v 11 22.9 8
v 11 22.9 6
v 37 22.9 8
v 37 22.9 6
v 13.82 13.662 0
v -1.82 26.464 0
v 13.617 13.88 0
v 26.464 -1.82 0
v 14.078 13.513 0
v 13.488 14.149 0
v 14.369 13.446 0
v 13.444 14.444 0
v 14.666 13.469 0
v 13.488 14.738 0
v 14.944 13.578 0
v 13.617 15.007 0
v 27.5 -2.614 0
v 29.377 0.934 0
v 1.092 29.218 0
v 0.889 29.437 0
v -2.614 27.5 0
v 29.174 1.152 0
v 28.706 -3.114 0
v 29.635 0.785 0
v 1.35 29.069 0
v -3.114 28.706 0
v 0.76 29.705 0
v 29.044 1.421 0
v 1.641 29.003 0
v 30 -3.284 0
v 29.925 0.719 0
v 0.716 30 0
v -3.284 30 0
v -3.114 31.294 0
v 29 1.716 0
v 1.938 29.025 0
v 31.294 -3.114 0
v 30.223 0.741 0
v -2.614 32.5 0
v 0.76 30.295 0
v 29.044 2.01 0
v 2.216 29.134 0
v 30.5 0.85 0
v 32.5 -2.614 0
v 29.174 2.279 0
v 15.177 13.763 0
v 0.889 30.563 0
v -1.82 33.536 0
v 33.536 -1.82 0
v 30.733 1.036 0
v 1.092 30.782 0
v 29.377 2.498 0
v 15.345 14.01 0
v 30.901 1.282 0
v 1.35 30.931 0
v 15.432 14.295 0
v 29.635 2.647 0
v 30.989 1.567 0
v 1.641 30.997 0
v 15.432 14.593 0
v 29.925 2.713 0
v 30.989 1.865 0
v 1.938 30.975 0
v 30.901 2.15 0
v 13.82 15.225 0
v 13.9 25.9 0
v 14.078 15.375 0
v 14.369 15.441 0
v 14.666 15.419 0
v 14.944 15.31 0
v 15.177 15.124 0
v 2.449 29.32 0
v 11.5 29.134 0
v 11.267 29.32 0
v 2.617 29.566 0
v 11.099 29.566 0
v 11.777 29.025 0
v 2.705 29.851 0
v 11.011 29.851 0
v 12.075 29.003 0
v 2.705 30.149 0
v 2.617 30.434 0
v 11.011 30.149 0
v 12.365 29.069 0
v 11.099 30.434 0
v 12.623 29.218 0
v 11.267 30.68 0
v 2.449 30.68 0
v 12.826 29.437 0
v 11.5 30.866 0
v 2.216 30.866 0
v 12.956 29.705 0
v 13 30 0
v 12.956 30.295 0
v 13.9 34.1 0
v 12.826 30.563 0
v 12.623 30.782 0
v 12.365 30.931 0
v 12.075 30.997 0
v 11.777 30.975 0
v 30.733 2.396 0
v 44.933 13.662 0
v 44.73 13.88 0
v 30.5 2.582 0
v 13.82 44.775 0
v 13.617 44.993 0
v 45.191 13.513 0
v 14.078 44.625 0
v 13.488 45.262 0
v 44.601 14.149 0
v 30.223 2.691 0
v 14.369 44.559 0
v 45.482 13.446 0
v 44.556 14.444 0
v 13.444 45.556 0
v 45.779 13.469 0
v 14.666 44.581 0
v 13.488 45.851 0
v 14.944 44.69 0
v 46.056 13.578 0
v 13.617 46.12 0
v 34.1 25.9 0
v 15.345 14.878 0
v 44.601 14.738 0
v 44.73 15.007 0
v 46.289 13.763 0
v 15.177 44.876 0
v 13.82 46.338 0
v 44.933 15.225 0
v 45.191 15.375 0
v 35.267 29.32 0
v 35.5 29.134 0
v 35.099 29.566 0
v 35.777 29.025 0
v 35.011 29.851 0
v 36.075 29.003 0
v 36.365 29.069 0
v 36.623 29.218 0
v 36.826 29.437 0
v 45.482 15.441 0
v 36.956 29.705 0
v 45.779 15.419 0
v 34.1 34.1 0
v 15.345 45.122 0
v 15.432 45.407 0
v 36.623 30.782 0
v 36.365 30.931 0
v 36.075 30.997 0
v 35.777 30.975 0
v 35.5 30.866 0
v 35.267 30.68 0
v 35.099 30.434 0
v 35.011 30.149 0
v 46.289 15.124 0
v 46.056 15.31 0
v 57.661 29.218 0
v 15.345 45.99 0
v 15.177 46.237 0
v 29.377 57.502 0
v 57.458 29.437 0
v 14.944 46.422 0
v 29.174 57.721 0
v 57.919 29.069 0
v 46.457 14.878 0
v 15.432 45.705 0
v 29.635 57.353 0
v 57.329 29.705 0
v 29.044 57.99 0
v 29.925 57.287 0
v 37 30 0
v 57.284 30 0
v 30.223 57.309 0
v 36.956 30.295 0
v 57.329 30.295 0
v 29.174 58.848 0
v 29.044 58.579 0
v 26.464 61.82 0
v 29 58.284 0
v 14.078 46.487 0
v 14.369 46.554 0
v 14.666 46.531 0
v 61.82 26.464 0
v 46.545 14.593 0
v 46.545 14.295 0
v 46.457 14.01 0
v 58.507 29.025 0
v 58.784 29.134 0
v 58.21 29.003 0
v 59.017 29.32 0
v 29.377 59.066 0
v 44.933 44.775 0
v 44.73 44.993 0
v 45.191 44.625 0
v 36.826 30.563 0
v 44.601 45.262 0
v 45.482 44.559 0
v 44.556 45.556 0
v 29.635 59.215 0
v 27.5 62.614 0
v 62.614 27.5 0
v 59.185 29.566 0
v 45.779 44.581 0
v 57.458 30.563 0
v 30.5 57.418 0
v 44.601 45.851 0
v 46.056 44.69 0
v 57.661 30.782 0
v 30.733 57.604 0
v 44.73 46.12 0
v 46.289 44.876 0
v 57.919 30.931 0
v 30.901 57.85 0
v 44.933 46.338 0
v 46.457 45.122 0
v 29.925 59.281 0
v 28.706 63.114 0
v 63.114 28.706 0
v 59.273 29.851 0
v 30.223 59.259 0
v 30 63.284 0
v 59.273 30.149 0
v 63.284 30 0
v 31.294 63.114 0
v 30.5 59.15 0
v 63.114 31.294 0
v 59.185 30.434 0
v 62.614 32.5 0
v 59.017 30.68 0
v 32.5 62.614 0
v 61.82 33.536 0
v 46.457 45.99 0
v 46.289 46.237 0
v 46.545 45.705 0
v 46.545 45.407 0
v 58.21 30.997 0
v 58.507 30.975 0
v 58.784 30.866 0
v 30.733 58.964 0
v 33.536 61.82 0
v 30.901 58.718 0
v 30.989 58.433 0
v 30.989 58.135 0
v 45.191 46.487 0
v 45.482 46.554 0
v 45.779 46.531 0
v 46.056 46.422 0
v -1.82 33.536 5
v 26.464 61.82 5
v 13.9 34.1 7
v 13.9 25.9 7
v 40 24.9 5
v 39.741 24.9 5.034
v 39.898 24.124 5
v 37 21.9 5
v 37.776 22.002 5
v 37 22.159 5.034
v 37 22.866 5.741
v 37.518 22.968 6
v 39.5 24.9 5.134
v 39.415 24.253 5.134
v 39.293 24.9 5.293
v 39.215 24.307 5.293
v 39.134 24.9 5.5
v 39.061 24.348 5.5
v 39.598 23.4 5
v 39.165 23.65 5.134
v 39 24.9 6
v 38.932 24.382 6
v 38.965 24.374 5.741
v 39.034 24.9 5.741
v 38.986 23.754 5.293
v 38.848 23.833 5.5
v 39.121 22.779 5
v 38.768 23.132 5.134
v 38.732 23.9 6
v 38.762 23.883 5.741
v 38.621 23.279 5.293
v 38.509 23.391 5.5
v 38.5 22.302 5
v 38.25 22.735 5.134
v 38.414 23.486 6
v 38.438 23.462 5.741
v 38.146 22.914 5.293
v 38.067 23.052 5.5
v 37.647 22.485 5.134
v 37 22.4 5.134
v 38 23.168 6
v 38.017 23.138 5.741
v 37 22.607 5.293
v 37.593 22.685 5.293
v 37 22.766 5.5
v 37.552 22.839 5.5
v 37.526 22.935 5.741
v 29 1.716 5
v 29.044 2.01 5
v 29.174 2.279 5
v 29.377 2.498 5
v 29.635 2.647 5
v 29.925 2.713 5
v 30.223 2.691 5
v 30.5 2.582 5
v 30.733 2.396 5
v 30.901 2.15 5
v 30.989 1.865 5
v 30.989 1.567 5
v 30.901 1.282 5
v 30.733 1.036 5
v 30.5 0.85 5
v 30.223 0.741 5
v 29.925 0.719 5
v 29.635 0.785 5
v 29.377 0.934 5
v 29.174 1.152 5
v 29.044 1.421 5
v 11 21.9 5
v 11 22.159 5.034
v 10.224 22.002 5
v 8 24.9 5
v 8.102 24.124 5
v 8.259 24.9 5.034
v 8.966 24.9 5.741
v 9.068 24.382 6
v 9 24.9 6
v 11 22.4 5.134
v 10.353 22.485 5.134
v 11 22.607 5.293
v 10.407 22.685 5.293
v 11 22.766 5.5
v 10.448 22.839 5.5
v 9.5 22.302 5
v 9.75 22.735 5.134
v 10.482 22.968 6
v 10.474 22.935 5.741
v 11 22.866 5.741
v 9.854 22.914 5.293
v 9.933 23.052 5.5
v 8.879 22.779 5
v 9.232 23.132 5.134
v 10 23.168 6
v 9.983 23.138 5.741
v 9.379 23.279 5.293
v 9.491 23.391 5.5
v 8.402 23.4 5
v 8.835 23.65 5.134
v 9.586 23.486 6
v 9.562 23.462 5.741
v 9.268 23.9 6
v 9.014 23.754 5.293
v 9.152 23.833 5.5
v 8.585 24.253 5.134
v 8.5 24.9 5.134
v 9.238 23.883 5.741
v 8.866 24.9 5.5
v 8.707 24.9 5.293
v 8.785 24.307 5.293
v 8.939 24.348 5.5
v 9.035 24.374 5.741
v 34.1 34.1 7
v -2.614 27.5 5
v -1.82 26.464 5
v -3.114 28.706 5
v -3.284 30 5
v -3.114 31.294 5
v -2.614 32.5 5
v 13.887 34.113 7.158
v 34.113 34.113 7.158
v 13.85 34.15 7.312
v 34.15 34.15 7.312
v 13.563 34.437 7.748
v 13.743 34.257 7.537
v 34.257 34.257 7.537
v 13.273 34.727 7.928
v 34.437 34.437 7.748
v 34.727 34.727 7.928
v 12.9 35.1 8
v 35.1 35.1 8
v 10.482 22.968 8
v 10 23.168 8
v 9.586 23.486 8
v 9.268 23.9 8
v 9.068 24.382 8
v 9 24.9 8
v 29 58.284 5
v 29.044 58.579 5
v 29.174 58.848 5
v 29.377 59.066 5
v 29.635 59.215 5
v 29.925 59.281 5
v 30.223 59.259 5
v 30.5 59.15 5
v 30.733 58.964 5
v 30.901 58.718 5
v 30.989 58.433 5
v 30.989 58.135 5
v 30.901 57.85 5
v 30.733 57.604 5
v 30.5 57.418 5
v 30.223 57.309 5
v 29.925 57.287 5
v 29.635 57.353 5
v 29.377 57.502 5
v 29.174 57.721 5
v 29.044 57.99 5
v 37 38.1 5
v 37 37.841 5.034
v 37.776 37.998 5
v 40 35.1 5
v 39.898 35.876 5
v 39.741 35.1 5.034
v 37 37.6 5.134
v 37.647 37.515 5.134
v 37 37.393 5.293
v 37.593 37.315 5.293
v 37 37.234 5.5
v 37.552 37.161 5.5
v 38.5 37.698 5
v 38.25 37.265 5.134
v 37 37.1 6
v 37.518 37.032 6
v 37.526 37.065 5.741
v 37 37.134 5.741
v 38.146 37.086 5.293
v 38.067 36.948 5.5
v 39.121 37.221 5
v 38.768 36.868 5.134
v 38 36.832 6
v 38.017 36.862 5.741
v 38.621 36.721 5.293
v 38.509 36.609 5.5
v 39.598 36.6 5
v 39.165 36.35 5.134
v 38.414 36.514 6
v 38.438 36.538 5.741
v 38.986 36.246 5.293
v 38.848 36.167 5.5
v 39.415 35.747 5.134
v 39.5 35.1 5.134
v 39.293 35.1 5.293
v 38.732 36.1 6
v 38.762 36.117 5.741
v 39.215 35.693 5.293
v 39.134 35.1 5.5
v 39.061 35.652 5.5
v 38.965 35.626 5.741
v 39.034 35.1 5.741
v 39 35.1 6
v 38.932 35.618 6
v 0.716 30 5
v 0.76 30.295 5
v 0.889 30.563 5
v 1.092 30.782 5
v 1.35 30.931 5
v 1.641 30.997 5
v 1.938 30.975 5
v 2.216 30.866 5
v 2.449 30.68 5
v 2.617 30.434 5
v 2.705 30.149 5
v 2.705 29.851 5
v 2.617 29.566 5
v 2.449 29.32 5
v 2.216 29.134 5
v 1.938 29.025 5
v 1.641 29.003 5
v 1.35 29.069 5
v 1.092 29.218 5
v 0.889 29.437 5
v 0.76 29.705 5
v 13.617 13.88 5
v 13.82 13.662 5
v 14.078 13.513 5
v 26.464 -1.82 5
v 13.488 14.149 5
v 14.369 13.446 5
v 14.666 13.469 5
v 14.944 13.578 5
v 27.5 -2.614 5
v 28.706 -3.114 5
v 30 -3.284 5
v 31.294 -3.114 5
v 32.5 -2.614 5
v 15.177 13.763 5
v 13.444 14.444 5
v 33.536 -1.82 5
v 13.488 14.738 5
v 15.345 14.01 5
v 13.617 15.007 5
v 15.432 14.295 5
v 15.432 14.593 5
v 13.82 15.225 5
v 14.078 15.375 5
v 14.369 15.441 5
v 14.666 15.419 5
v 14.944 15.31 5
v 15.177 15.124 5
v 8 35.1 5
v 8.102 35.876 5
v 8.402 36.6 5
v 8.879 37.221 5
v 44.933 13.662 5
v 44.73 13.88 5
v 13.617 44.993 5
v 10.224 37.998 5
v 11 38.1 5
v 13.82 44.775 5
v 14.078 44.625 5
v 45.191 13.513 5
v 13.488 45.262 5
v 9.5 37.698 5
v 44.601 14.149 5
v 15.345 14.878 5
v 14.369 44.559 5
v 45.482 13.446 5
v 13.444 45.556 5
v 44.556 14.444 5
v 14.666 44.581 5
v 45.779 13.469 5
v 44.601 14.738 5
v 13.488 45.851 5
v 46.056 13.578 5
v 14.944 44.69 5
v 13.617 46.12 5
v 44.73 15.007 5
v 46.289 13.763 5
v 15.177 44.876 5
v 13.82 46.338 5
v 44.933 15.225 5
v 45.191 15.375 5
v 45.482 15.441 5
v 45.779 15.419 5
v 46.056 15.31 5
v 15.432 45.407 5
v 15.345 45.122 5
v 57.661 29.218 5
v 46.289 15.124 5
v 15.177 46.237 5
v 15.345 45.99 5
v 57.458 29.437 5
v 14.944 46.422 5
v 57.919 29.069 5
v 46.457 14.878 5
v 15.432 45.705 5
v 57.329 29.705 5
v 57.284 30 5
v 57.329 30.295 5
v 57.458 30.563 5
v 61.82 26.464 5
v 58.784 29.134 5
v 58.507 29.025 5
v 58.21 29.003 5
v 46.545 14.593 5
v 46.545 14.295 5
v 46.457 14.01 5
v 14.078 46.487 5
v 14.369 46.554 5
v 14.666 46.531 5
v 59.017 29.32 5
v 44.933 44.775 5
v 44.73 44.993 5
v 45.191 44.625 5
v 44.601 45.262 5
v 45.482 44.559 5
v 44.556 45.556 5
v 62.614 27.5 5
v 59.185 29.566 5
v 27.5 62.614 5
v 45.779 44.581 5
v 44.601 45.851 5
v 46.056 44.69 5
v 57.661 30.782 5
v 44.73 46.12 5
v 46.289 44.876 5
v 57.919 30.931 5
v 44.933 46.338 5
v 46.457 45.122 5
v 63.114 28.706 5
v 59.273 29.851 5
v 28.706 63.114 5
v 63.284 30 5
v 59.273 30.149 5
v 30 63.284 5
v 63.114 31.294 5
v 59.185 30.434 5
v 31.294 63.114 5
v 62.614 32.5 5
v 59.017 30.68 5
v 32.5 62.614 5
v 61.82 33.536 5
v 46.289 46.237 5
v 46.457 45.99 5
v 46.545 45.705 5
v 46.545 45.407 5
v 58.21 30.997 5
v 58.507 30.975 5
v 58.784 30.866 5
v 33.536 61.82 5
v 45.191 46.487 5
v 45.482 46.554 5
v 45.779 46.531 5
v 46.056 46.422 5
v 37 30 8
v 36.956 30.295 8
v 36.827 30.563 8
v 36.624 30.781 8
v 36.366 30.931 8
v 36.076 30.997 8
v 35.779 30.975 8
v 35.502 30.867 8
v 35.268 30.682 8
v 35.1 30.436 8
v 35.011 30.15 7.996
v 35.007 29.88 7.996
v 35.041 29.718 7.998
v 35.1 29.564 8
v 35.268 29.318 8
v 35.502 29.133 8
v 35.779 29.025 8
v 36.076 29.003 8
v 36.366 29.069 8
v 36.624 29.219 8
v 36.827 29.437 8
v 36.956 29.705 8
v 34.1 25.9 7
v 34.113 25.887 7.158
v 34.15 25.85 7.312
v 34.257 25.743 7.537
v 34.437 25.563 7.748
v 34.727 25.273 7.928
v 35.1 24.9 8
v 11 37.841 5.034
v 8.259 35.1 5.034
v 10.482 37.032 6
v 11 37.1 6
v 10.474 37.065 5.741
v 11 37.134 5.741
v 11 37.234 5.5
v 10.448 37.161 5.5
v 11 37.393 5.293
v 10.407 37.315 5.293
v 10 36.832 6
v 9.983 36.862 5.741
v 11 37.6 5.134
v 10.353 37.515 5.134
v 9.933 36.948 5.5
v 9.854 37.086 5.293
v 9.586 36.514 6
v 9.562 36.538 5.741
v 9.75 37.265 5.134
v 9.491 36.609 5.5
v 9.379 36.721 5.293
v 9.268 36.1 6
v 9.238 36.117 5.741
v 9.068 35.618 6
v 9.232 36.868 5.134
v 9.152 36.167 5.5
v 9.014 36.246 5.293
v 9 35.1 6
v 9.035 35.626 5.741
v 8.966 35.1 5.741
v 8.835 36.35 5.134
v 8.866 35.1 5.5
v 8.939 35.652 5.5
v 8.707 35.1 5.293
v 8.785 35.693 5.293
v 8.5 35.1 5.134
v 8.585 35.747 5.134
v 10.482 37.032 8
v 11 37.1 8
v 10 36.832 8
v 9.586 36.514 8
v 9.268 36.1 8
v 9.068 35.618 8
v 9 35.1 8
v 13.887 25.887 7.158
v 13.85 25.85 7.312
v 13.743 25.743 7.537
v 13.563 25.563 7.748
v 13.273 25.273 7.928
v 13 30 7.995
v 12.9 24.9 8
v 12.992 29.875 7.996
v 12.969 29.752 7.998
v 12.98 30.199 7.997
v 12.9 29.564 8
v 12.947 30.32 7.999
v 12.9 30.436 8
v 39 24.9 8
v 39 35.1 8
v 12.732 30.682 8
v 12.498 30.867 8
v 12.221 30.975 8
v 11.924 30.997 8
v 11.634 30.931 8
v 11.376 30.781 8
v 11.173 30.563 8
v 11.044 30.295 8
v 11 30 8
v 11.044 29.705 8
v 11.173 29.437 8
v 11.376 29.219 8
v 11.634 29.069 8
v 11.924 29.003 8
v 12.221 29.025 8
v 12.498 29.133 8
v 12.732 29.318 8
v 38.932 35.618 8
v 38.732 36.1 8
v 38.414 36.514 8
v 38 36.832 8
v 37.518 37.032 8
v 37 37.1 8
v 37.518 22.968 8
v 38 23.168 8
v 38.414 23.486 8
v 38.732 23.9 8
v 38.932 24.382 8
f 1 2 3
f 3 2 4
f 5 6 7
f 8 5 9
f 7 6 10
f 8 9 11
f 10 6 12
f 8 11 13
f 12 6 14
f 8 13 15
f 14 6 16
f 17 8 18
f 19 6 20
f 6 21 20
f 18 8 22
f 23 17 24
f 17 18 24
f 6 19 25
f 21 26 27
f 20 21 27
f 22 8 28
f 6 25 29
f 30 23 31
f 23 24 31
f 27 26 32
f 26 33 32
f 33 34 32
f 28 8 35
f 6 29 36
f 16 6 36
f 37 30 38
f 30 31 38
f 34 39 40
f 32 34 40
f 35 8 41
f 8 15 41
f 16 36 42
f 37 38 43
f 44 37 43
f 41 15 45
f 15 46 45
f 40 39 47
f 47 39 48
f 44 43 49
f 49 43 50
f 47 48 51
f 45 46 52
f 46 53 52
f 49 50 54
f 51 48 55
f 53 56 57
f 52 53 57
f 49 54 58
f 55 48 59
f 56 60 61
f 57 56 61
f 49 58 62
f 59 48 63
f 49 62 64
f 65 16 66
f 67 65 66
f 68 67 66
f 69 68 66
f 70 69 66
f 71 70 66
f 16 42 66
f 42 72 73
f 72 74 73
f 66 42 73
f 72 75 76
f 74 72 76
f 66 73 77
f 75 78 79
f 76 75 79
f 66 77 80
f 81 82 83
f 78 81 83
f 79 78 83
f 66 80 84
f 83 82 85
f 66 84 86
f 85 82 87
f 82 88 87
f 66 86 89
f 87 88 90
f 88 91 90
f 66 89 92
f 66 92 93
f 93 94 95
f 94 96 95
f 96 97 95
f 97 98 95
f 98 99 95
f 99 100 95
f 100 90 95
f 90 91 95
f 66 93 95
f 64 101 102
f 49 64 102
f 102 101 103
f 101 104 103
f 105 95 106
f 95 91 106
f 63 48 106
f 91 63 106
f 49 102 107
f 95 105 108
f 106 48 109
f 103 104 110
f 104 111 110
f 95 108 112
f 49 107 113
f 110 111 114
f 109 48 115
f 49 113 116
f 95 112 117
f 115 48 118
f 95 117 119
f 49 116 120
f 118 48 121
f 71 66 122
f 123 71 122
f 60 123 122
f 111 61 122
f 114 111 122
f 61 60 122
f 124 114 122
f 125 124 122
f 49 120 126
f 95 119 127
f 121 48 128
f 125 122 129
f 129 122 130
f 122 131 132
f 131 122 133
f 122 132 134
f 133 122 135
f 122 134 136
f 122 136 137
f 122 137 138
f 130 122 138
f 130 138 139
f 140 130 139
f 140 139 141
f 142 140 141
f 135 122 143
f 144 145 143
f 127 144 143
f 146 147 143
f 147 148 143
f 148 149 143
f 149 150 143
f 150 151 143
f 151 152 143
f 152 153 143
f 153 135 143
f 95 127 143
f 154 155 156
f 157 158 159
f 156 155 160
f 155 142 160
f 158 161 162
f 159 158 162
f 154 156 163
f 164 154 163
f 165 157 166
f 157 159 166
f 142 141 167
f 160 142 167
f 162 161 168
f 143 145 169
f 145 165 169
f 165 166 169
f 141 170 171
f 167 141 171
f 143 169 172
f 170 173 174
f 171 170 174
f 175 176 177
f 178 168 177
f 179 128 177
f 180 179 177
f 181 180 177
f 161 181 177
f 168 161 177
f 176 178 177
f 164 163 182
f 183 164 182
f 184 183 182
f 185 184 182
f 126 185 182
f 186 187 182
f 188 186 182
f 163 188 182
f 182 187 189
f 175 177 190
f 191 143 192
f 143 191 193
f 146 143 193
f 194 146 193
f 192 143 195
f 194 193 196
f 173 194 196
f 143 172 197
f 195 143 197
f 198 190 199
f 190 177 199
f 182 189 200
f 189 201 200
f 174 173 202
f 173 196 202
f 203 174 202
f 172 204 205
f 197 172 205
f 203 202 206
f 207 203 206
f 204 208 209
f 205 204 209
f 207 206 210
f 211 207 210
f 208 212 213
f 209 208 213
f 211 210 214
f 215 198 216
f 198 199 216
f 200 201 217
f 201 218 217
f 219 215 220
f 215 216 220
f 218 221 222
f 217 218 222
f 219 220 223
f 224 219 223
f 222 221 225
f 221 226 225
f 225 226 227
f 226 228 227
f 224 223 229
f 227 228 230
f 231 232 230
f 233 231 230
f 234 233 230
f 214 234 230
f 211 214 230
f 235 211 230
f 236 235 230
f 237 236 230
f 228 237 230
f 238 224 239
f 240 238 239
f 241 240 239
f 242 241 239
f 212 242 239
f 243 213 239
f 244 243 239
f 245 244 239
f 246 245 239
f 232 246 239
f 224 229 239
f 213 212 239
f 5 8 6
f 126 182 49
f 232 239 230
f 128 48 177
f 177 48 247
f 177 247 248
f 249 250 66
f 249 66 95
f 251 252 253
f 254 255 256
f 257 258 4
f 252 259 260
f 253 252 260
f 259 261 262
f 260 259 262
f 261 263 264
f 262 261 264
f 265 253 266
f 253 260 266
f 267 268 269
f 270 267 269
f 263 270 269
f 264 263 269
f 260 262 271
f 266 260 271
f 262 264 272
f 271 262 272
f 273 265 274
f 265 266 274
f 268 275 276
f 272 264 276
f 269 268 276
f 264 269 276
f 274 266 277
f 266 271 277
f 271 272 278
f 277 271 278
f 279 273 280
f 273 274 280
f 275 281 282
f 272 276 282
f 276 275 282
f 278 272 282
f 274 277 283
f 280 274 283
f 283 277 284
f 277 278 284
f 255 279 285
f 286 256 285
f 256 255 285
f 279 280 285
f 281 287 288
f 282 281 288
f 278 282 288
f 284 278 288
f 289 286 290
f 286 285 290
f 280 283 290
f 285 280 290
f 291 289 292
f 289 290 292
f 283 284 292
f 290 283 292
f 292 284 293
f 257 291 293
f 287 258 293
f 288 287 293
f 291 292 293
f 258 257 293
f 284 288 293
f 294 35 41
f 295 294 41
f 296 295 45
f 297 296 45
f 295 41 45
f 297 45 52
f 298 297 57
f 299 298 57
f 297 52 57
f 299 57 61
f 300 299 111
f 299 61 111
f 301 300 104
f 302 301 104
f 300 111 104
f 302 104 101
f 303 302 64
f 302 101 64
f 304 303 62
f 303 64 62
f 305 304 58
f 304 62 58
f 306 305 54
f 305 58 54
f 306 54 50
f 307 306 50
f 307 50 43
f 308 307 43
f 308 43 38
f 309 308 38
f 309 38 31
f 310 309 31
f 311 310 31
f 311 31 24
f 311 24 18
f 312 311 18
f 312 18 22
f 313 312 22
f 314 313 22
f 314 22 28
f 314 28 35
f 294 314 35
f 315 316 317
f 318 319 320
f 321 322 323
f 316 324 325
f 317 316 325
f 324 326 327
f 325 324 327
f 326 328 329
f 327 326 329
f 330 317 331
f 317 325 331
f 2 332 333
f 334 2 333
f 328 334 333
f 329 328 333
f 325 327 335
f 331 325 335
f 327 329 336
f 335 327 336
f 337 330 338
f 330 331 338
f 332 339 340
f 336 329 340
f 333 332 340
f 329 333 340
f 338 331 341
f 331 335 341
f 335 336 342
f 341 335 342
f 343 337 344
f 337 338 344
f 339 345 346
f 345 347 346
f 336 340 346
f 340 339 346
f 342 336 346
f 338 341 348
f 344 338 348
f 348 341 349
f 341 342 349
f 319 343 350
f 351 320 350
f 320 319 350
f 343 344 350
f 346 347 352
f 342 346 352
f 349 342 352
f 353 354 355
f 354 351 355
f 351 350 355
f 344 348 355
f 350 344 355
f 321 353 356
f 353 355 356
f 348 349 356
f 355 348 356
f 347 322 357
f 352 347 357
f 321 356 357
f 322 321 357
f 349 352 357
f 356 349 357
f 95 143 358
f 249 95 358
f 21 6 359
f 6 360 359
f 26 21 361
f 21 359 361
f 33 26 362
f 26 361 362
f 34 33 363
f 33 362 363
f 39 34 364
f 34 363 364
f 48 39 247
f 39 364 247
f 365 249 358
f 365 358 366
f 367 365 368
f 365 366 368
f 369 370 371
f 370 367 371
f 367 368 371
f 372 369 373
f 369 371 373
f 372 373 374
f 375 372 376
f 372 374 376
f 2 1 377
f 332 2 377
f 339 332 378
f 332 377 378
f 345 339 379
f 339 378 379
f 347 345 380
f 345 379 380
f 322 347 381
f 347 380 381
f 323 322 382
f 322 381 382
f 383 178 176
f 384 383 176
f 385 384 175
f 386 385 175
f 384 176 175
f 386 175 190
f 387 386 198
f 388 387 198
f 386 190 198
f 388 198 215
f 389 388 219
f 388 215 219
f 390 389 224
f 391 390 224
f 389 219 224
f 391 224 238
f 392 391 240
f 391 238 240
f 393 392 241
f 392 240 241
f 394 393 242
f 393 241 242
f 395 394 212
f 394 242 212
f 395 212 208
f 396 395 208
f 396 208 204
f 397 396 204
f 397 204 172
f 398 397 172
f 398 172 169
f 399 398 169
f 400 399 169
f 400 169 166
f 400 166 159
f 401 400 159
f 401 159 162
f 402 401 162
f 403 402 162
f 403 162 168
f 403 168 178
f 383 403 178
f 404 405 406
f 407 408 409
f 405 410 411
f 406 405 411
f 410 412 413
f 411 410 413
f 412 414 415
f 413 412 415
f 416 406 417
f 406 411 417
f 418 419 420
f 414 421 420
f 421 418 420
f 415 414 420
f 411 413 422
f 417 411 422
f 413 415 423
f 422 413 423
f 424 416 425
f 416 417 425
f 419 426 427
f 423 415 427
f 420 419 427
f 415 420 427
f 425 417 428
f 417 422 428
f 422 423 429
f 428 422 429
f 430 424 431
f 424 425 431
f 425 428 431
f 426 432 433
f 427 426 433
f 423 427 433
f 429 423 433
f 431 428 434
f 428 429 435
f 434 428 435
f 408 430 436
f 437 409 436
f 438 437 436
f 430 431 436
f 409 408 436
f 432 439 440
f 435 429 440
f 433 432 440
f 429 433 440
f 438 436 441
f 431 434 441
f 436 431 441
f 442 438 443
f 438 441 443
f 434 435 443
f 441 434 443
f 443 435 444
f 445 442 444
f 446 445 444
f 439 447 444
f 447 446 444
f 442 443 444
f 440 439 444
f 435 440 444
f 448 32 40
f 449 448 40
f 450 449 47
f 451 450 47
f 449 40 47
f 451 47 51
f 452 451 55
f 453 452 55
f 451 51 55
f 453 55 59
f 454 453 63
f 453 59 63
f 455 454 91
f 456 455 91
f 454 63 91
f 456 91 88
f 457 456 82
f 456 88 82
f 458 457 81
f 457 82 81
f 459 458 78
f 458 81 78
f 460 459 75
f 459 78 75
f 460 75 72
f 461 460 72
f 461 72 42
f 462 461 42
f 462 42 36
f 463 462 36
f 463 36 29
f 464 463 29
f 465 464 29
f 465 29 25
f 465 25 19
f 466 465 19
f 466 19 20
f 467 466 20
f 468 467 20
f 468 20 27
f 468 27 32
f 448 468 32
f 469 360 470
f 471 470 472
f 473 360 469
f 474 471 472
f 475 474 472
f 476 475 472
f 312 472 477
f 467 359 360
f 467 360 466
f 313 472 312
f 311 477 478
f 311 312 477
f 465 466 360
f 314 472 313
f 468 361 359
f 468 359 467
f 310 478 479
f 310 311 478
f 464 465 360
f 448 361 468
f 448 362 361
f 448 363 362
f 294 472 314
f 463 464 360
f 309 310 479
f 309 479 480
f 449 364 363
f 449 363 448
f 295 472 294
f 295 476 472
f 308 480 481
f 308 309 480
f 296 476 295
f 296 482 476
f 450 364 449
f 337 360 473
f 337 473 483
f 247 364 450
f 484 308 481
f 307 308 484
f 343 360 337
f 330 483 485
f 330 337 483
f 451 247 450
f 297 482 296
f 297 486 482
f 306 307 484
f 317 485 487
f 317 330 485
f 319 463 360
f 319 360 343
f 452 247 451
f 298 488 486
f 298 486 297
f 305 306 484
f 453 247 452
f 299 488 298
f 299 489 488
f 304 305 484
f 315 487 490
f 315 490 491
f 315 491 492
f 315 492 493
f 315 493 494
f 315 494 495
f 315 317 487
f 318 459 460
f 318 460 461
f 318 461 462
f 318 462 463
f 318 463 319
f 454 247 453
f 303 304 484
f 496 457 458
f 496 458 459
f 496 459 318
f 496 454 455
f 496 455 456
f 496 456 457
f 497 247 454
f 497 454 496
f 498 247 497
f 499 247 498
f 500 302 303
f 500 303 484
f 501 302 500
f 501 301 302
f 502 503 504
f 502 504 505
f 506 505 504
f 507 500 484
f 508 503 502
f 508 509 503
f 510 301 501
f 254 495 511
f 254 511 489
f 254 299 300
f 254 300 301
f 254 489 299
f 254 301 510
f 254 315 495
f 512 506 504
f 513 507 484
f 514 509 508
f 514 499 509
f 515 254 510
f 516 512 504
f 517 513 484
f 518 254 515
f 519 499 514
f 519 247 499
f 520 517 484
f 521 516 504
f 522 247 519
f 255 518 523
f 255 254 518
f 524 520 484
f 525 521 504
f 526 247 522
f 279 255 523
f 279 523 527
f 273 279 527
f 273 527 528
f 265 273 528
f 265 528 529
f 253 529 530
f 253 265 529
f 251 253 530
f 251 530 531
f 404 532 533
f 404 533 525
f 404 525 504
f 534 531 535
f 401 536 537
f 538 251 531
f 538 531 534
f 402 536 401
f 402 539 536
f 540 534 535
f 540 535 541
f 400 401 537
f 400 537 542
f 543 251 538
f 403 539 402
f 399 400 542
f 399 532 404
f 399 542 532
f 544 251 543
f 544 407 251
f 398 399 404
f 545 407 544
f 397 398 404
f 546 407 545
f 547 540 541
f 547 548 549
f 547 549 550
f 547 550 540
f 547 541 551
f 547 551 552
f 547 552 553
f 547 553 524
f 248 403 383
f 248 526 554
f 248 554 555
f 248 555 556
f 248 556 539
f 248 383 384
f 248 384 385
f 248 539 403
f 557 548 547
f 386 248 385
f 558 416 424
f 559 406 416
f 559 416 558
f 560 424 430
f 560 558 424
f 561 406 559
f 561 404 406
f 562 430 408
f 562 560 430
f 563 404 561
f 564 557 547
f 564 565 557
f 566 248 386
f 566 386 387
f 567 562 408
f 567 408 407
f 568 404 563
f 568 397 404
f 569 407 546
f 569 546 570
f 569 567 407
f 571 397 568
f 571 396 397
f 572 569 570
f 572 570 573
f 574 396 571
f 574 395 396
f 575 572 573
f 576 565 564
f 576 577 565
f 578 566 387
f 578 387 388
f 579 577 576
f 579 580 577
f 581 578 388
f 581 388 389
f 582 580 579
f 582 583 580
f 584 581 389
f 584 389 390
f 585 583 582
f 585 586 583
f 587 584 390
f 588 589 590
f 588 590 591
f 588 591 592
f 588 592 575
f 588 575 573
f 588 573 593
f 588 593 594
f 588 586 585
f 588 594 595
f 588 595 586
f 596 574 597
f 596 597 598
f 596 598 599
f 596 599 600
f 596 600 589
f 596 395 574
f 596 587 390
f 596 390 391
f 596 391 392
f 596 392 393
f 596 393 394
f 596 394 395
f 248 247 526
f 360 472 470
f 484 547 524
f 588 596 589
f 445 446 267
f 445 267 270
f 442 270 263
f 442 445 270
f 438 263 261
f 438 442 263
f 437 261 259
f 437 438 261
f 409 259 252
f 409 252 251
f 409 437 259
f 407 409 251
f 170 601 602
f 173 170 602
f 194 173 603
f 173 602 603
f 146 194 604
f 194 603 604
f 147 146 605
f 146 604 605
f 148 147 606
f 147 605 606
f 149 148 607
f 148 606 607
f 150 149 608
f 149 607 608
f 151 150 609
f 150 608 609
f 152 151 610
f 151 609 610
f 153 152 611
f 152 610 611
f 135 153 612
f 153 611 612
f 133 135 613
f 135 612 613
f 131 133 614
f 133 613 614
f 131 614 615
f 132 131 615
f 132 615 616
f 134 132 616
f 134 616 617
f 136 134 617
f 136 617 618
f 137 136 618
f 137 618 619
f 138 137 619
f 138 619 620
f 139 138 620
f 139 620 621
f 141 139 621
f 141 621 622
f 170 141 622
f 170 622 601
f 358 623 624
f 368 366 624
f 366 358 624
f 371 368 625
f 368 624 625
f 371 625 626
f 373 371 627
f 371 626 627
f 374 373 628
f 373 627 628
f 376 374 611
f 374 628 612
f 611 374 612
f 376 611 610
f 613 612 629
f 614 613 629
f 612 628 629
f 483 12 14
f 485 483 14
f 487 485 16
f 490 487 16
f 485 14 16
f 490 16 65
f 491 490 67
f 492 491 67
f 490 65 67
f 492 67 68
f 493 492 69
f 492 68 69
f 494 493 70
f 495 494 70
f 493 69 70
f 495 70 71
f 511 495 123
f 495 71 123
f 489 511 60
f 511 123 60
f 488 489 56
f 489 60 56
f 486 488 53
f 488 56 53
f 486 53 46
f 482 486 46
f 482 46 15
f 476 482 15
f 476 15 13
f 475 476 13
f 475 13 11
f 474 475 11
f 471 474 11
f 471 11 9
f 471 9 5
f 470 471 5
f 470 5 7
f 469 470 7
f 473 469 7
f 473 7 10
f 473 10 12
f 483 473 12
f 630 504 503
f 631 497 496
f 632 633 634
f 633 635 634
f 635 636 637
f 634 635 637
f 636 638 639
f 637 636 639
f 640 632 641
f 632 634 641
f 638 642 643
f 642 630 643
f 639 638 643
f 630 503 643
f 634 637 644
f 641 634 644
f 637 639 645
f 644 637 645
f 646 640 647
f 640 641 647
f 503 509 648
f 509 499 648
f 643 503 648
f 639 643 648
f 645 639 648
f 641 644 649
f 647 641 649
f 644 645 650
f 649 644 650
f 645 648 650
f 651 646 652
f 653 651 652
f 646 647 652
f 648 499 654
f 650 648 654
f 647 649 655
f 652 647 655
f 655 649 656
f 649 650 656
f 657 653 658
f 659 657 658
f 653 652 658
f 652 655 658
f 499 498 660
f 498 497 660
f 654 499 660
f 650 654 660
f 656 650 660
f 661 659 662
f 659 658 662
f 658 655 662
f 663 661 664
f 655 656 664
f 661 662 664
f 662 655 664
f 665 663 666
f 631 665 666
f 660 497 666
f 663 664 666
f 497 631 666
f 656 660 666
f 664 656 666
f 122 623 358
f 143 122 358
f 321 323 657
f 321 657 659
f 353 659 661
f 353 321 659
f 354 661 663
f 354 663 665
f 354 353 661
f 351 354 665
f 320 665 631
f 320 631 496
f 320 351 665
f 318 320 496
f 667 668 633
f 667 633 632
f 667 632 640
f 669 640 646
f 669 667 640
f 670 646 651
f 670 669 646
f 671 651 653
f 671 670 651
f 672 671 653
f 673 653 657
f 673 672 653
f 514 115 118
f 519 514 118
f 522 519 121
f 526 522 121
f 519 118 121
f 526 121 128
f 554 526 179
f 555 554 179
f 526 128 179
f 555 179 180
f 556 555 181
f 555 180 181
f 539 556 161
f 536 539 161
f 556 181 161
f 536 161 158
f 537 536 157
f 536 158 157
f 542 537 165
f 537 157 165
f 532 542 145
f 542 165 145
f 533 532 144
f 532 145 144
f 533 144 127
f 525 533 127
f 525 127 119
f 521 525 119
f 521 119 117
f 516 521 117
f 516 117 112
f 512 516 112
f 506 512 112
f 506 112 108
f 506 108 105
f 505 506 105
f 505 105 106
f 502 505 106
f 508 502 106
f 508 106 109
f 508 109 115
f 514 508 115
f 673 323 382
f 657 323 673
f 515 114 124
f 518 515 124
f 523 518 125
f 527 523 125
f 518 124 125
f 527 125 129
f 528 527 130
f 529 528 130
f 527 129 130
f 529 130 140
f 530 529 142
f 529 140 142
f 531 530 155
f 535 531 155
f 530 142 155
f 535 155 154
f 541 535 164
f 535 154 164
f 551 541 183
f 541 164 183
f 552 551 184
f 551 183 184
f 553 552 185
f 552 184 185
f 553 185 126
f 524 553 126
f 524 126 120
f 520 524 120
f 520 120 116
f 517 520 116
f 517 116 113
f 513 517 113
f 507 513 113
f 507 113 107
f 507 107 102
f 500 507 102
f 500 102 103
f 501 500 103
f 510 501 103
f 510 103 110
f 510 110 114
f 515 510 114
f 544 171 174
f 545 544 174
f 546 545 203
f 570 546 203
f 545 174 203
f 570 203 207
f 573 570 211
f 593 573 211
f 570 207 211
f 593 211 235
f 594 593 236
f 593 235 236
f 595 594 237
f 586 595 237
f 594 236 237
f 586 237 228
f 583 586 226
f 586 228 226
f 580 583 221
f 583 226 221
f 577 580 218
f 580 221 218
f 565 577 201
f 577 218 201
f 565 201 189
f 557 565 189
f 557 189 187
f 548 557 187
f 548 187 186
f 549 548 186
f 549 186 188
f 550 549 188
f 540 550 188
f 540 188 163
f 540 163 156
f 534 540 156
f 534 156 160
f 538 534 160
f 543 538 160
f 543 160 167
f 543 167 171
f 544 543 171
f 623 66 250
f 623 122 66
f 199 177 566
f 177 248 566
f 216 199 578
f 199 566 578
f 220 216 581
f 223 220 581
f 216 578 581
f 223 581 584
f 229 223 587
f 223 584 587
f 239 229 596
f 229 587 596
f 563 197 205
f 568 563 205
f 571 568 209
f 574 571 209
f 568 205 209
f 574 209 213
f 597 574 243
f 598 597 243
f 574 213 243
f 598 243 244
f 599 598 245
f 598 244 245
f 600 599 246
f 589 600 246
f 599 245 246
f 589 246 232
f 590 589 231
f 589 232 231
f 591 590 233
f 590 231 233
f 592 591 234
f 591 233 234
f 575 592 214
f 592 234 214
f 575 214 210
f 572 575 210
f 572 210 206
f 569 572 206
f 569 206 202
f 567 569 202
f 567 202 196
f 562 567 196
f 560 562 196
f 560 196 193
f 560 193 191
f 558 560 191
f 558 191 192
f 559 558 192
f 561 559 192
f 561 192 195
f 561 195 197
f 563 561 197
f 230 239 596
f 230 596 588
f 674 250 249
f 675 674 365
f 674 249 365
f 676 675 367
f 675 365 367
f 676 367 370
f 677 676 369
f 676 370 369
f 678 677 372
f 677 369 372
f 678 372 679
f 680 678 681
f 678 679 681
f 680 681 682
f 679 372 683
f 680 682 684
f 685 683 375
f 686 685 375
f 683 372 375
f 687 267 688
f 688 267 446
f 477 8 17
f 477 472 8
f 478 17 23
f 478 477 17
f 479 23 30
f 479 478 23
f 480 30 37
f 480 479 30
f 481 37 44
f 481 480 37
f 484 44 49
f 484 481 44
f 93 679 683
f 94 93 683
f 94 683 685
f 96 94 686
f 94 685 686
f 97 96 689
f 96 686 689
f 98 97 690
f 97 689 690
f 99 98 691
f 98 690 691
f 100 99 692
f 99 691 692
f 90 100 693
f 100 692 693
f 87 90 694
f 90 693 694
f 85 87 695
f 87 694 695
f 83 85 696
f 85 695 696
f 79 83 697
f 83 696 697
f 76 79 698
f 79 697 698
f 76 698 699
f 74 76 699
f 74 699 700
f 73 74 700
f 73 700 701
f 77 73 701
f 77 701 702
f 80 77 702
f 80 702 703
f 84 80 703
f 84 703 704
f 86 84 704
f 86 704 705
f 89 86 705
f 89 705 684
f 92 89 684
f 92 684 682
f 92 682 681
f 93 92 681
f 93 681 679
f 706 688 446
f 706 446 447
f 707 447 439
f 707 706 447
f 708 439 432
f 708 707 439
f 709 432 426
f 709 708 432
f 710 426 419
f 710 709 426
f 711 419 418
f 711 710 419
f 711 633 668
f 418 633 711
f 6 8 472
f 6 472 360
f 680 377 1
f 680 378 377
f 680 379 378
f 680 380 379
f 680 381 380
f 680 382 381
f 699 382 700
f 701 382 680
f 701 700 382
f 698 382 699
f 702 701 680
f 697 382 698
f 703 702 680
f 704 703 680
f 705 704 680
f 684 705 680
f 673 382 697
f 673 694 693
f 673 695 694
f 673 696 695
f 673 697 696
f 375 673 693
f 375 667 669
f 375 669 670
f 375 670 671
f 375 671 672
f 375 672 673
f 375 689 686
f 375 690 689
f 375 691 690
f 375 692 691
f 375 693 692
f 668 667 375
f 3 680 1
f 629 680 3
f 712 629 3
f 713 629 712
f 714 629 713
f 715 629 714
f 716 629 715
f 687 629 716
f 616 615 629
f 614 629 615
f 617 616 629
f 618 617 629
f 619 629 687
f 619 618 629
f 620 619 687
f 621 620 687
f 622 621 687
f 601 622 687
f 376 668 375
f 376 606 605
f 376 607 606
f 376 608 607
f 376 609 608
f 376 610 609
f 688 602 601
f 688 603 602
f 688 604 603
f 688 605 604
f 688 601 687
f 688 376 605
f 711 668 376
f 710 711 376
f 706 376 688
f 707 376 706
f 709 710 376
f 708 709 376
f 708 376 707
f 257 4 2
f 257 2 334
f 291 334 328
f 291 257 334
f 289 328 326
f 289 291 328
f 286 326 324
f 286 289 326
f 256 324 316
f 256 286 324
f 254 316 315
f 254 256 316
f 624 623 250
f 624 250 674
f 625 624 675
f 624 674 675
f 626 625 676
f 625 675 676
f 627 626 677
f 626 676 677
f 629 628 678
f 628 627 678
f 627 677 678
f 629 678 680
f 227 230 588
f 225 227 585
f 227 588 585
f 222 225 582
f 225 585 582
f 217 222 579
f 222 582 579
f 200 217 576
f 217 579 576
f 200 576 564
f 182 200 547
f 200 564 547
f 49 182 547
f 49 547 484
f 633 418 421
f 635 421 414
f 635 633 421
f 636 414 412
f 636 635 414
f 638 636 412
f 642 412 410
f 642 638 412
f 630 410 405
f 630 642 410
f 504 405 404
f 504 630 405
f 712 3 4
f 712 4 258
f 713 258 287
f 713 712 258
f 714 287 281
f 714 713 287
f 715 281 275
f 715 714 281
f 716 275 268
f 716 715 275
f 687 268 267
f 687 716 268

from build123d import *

# Parameters (mm, degrees)
SKETCH1_W           = 60
SKETCH1_H           = 60
BOSS_EXTRUDE1_DEPTH = 5
SKETCH2_W           = 30
SKETCH2_H           = 14.2
SKETCH2_W_2         = 20.2
SKETCH2_H_2         = 8.2
BOSS_EXTRUDE2_DEPTH = 3
SKETCH3_W           = 20.2
SKETCH3_H           = 8.2
CUT_EXTRUDE1_DEPTH  = 15
SKETCH5_R           = 1
CUT_EXTRUDE2_DEPTH  = 15
FILLET1_R           = 2
SKETCH6_W           = 120.017280655
SKETCH6_H           = 101.423054075
CUT_EXTRUDE3_DEPTH  = 15
BOSS_EXTRUDE3_DEPTH = 5
CUT_EXTRUDE4_DEPTH  = 15
FILLET3_R           = 5
SKETCH9_R           = 1
CUT_EXTRUDE5_DEPTH  = 15
SKETCH10_R          = 1
CUT_EXTRUDE6_DEPTH  = 10
FILLET4_R           = 1


with BuildPart() as part:
    # Sketch1 → Boss-Extrude1 (new body)
    with BuildSketch(Plane.XY):
        with Locations((30, 30)):
            Rectangle(SKETCH1_W, SKETCH1_H)
    extrude(amount=BOSS_EXTRUDE1_DEPTH)

    # Sketch2 → Boss-Extrude2 (add)
    with BuildSketch(Plane.XY.offset(5)):
        with Locations((24, 30)):
            Rectangle(SKETCH2_W, SKETCH2_H)
        with Locations((24, 30)):
            Rectangle(SKETCH2_W_2, SKETCH2_H_2, mode=Mode.SUBTRACT)
    extrude(amount=BOSS_EXTRUDE2_DEPTH)

    # Sketch3 → Cut-Extrude1 (cut)
    with BuildSketch(Plane.XY.offset(5)):
        with Locations((24, 30)):
            Rectangle(SKETCH3_W, SKETCH3_H)
    extrude(amount=-CUT_EXTRUDE1_DEPTH, mode=Mode.SUBTRACT)

    # Sketch5 → Cut-Extrude2 (cut)
    with BuildSketch(Plane.XY.offset(8)):
        with Locations((12, 30)):
            Circle(SKETCH5_R)
        with Locations((36, 30)):
            Circle(SKETCH5_R)
    extrude(amount=-CUT_EXTRUDE2_DEPTH, mode=Mode.SUBTRACT)

    # Fillet1
    fillet1_edges = [part.edges().sort_by_distance(p)[0] for p in [
        (39, 22.9, 6.5),
        (39, 37.1, 6.5),
        (9, 37.1, 6.5),
        (9, 22.9, 6.5),
        (0, 0, 2.5),
        (0, 60, 2.5),
        (60, 60, 2.5),
        (60, 0, 2.5),
    ]]
    fillet(fillet1_edges, radius=FILLET1_R)

    # Sketch6 → Cut-Extrude3 (cut)
    with BuildSketch(Plane(origin=(0, 0, 0), x_dir=(-1, 0, 0), z_dir=(0, 0, -1))):
        with Locations((-31.690384235, 31.655167897)):
            Rectangle(SKETCH6_W, SKETCH6_H)
        Polygon((-8.786796564, 51.213203436), (12.426406871, 30), (-30, -12.426406871), (-72.426406871, 30), (-30, 72.426406871), align=None, mode=Mode.SUBTRACT)
    extrude(amount=-CUT_EXTRUDE3_DEPTH, mode=Mode.SUBTRACT)

    # Sketch7 → Boss-Extrude3 (add)
    with BuildSketch(Plane(origin=(0, 0, 0), x_dir=(-1, 0, 0), z_dir=(0, 0, -1))):
        Polygon((-8.786796564, 51.213203436), (12.426406871, 30), (-30, -12.426406871), (-72.426406871, 30), (-30, 72.426406871), align=None)
        Polygon((-19.393398282, 40.606601718), (-8.786796564, 30), (-30, 8.786796564), (-51.213203436, 30), (-30, 51.213203436), align=None, mode=Mode.SUBTRACT)
    extrude(amount=-BOSS_EXTRUDE3_DEPTH)

    # Sketch8 → Cut-Extrude4 (cut)
    with BuildSketch(Plane(origin=(0, 0, 0), x_dir=(-1, 0, 0), z_dir=(0, 0, -1))):
        Polygon((-30, -12.426406871), (12.426406871, 30), (-30, 72.426406871), (-72.426406871, 30), align=None)
        Polygon((-30, -5.355339059), (5.355339059, 30), (-30, 65.355339059), (-65.355339059, 30), align=None, mode=Mode.SUBTRACT)
    extrude(amount=-CUT_EXTRUDE4_DEPTH, mode=Mode.SUBTRACT)

    # Fillet3
    fillet3_edges = [part.edges().sort_by_distance(p)[0] for p in [
        (65.355339059, 30, 2.5),
        (30, 65.355339059, 2.5),
        (-5.355339059, 30, 2.5),
        (30, -5.355339059, 2.5),
    ]]
    fillet(fillet3_edges, radius=FILLET3_R)

    # Sketch9 → Cut-Extrude5 (cut)
    with BuildSketch(Plane(origin=(0, 0, 0), x_dir=(-1, 0, 0), z_dir=(0, 0, -1))):
        with Locations((-30, 58.284271247)):
            Circle(SKETCH9_R)
        with Locations((-30, 1.715728753)):
            Circle(SKETCH9_R)
        with Locations((-1.715728753, 30)):
            Circle(SKETCH9_R)
        with Locations((-58.284271247, 30)):
            Circle(SKETCH9_R)
    extrude(amount=-CUT_EXTRUDE5_DEPTH, mode=Mode.SUBTRACT)

    # Sketch10 → Cut-Extrude6 (cut)
    with BuildSketch(Plane(origin=(0, 0, 0), x_dir=(-1, 0, 0), z_dir=(0, 0, -1))):
        with Locations((-45.556349186, 45.556349186)):
            Circle(SKETCH10_R)
        with Locations((-45.556349186, 14.443650814)):
            Circle(SKETCH10_R)
        with Locations((-14.443650814, 14.443650814)):
            Circle(SKETCH10_R)
        with Locations((-14.443650814, 45.556349186)):
            Circle(SKETCH10_R)
    extrude(amount=-CUT_EXTRUDE6_DEPTH, mode=Mode.SUBTRACT)

    # Fillet4
    # the kernel refuses this fillet: 1 mm, written as the material it adds along each edge
    with BuildSketch(Plane(origin=(37, 35.1, 5), x_dir=(0, 1, 0), z_dir=(-1, 0, 0))) as fillet4_piece_1:
        with BuildLine():
            CenterArc((2 + FILLET4_R, -FILLET4_R), FILLET4_R, 90, 90)
            Line((2, -FILLET4_R), (2, 0))
            Line((2, 0), (2 + FILLET4_R, 0))
        make_face()
    revolve(axis=Axis((37, 35.1, 5), (0, 0, -1)), revolution_arc=90)
    with BuildSketch(Plane(origin=(37, 22.9, 5), x_dir=(0, -1, 0), z_dir=(-1, 0, 0)), Plane(origin=(11, 37.1, 5), x_dir=(0, 1, 0), z_dir=(1, 0, 0))) as fillet4_piece_2:
        with BuildLine():
            CenterArc((FILLET4_R, FILLET4_R), FILLET4_R, 180, 90)
            Line((0, FILLET4_R), (0, 0))
            Line((0, 0), (FILLET4_R, 0))
        make_face()
    extrude(amount=26)
    with BuildSketch(Plane(origin=(9, 24.9, 5), x_dir=(-1, 0, 0), z_dir=(0, 1, 0)), Plane(origin=(39, 35.1, 5), x_dir=(1, 0, 0), z_dir=(0, -1, 0))) as fillet4_piece_3:
        with BuildLine():
            CenterArc((FILLET4_R, FILLET4_R), FILLET4_R, 180, 90)
            Line((0, FILLET4_R), (0, 0))
            Line((0, 0), (FILLET4_R, 0))
        make_face()
    extrude(amount=10.2)
    with BuildSketch(Plane(origin=(11, 24.9, 5), x_dir=(0, -1, 0), z_dir=(1, 0, 0))) as fillet4_piece_4:
        with BuildLine():
            CenterArc((2 + FILLET4_R, -FILLET4_R), FILLET4_R, 90, 90)
            Line((2, -FILLET4_R), (2, 0))
            Line((2, 0), (2 + FILLET4_R, 0))
        make_face()
    revolve(axis=Axis((11, 24.9, 5), (0, 0, -1)), revolution_arc=90)
    with BuildSketch(Plane(origin=(11, 35.1, 5), x_dir=(0, 1, 0), z_dir=(1, 0, 0))) as fillet4_piece_5:
        with BuildLine():
            CenterArc((2 + FILLET4_R, FILLET4_R), FILLET4_R, 180, 90)
            Line((2, FILLET4_R), (2, 0))
            Line((2, 0), (2 + FILLET4_R, 0))
        make_face()
    revolve(axis=Axis((11, 35.1, 5), (0, 0, 1)), revolution_arc=90)
    with BuildSketch(Plane(origin=(37, 24.9, 5), x_dir=(1, 0, 0), z_dir=(0, 1, 0))) as fillet4_piece_6:
        with BuildLine():
            CenterArc((2 + FILLET4_R, -FILLET4_R), FILLET4_R, 90, 90)
            Line((2, -FILLET4_R), (2, 0))
            Line((2, 0), (2 + FILLET4_R, 0))
        make_face()
    revolve(axis=Axis((37, 24.9, 5), (0, 0, -1)), revolution_arc=90)
    # the kernel refuses this fillet: 1 mm, written as the material it takes off along each edge
    with BuildSketch(Plane(origin=(34.1, 25.9, 8), x_dir=(0, 0, -1), z_dir=(0, 1, 0)), Plane(origin=(13.9, 34.1, 8), x_dir=(0, 0, -1), z_dir=(0, -1, 0))) as fillet4_2_piece_1:
        with BuildLine():
            CenterArc((FILLET4_R, -FILLET4_R), FILLET4_R, 90, 90)
            Line((0, -FILLET4_R), (0, 0))
            Line((0, 0), (FILLET4_R, 0))
        make_face()
    extrude(amount=8.2, mode=Mode.SUBTRACT)
    with BuildSketch(Plane(origin=(34.1, 34.1, 8), x_dir=(0, 0, -1), z_dir=(-1, 0, 0)), Plane(origin=(13.9, 25.9, 8), x_dir=(0, 0, -1), z_dir=(1, 0, 0))) as fillet4_2_piece_2:
        with BuildLine():
            CenterArc((FILLET4_R, -FILLET4_R), FILLET4_R, 90, 90)
            Line((0, -FILLET4_R), (0, 0))
            Line((0, 0), (FILLET4_R, 0))
        make_face()
    extrude(amount=20.2, mode=Mode.SUBTRACT)
    with BuildSketch(Plane(origin=(13.9, 25.9, 8), x_dir=(0, 0, -1), z_dir=(1, 0, 0))) as fillet4_2_piece_3a_section:
        with BuildLine():
            CenterArc((FILLET4_R, -FILLET4_R), FILLET4_R, 90, 90)
            Line((0, -FILLET4_R), (0, 0))
            Line((0, 0), (FILLET4_R, 0))
        make_face()
    fillet4_2_piece_3a = extrude(amount=22.7, mode=Mode.PRIVATE)
    fillet4_2_piece_3a = split(fillet4_2_piece_3a, bisect_by=Plane(origin=(34.1, 25.673604886, 7.773604886), z_dir=(1, 0, 0)), keep=Keep.TOP, mode=Mode.PRIVATE)
    with BuildSketch(Plane(origin=(34.1, 23.4, 8), x_dir=(0, 0, -1), z_dir=(0, 1, 0))) as fillet4_2_piece_3b_section:
        with BuildLine():
            CenterArc((FILLET4_R, -FILLET4_R), FILLET4_R, 90, 90)
            Line((0, -FILLET4_R), (0, 0))
            Line((0, 0), (FILLET4_R, 0))
        make_face()
    fillet4_2_piece_3b = extrude(amount=10.7, mode=Mode.PRIVATE)
    fillet4_2_piece_3b = split(fillet4_2_piece_3b, bisect_by=Plane(origin=(34.326395114, 25.9, 7.773604886), z_dir=(0, -1, 0)), keep=Keep.TOP, mode=Mode.PRIVATE)
    fillet4_2_piece_3 = fillet4_2_piece_3a & fillet4_2_piece_3b
    add(fillet4_2_piece_3, mode=Mode.SUBTRACT)
    with BuildSketch(Plane(origin=(34.1, 25.9, 8), x_dir=(0, 0, -1), z_dir=(0, 1, 0))) as fillet4_2_piece_4a_section:
        with BuildLine():
            CenterArc((FILLET4_R, -FILLET4_R), FILLET4_R, 90, 90)
            Line((0, -FILLET4_R), (0, 0))
            Line((0, 0), (FILLET4_R, 0))
        make_face()
    fillet4_2_piece_4a = extrude(amount=10.7, mode=Mode.PRIVATE)
    fillet4_2_piece_4a = split(fillet4_2_piece_4a, bisect_by=Plane(origin=(34.326395114, 34.1, 7.773604886), z_dir=(0, 1, 0)), keep=Keep.TOP, mode=Mode.PRIVATE)
    with BuildSketch(Plane(origin=(36.6, 34.1, 8), x_dir=(0, 0, -1), z_dir=(-1, 0, 0))) as fillet4_2_piece_4b_section:
        with BuildLine():
            CenterArc((FILLET4_R, -FILLET4_R), FILLET4_R, 90, 90)
            Line((0, -FILLET4_R), (0, 0))
            Line((0, 0), (FILLET4_R, 0))
        make_face()
    fillet4_2_piece_4b = extrude(amount=22.7, mode=Mode.PRIVATE)
    fillet4_2_piece_4b = split(fillet4_2_piece_4b, bisect_by=Plane(origin=(34.1, 34.326395114, 7.773604886), z_dir=(1, 0, 0)), keep=Keep.TOP, mode=Mode.PRIVATE)
    fillet4_2_piece_4 = fillet4_2_piece_4a & fillet4_2_piece_4b
    add(fillet4_2_piece_4, mode=Mode.SUBTRACT)
    with BuildSketch(Plane(origin=(13.9, 36.6, 8), x_dir=(0, 0, -1), z_dir=(0, -1, 0))) as fillet4_2_piece_5a_section:
        with BuildLine():
            CenterArc((FILLET4_R, -FILLET4_R), FILLET4_R, 90, 90)
            Line((0, -FILLET4_R), (0, 0))
            Line((0, 0), (FILLET4_R, 0))
        make_face()
    fillet4_2_piece_5a = extrude(amount=10.7, mode=Mode.PRIVATE)
    fillet4_2_piece_5a = split(fillet4_2_piece_5a, bisect_by=Plane(origin=(13.673604886, 34.1, 7.773604886), z_dir=(0, 1, 0)), keep=Keep.TOP, mode=Mode.PRIVATE)
    with BuildSketch(Plane(origin=(34.1, 34.1, 8), x_dir=(0, 0, -1), z_dir=(-1, 0, 0))) as fillet4_2_piece_5b_section:
        with BuildLine():
            CenterArc((FILLET4_R, -FILLET4_R), FILLET4_R, 90, 90)
            Line((0, -FILLET4_R), (0, 0))
            Line((0, 0), (FILLET4_R, 0))
        make_face()
    fillet4_2_piece_5b = extrude(amount=22.7, mode=Mode.PRIVATE)
    fillet4_2_piece_5b = split(fillet4_2_piece_5b, bisect_by=Plane(origin=(13.9, 34.326395114, 7.773604886), z_dir=(-1, 0, 0)), keep=Keep.TOP, mode=Mode.PRIVATE)
    fillet4_2_piece_5 = fillet4_2_piece_5a & fillet4_2_piece_5b
    add(fillet4_2_piece_5, mode=Mode.SUBTRACT)
    with BuildSketch(Plane(origin=(11.4, 25.9, 8), x_dir=(0, 0, -1), z_dir=(1, 0, 0))) as fillet4_2_piece_6a_section:
        with BuildLine():
            CenterArc((FILLET4_R, -FILLET4_R), FILLET4_R, 90, 90)
            Line((0, -FILLET4_R), (0, 0))
            Line((0, 0), (FILLET4_R, 0))
        make_face()
    fillet4_2_piece_6a = extrude(amount=22.7, mode=Mode.PRIVATE)
    fillet4_2_piece_6a = split(fillet4_2_piece_6a, bisect_by=Plane(origin=(13.9, 25.673604886, 7.773604886), z_dir=(-1, 0, 0)), keep=Keep.TOP, mode=Mode.PRIVATE)
    with BuildSketch(Plane(origin=(13.9, 34.1, 8), x_dir=(0, 0, -1), z_dir=(0, -1, 0))) as fillet4_2_piece_6b_section:
        with BuildLine():
            CenterArc((FILLET4_R, -FILLET4_R), FILLET4_R, 90, 90)
            Line((0, -FILLET4_R), (0, 0))
            Line((0, 0), (FILLET4_R, 0))
        make_face()
    fillet4_2_piece_6b = extrude(amount=10.7, mode=Mode.PRIVATE)
    fillet4_2_piece_6b = split(fillet4_2_piece_6b, bisect_by=Plane(origin=(13.673604886, 25.9, 7.773604886), z_dir=(0, -1, 0)), keep=Keep.TOP, mode=Mode.PRIVATE)
    fillet4_2_piece_6 = fillet4_2_piece_6a & fillet4_2_piece_6b
    add(fillet4_2_piece_6, mode=Mode.SUBTRACT)


solid = part.part
